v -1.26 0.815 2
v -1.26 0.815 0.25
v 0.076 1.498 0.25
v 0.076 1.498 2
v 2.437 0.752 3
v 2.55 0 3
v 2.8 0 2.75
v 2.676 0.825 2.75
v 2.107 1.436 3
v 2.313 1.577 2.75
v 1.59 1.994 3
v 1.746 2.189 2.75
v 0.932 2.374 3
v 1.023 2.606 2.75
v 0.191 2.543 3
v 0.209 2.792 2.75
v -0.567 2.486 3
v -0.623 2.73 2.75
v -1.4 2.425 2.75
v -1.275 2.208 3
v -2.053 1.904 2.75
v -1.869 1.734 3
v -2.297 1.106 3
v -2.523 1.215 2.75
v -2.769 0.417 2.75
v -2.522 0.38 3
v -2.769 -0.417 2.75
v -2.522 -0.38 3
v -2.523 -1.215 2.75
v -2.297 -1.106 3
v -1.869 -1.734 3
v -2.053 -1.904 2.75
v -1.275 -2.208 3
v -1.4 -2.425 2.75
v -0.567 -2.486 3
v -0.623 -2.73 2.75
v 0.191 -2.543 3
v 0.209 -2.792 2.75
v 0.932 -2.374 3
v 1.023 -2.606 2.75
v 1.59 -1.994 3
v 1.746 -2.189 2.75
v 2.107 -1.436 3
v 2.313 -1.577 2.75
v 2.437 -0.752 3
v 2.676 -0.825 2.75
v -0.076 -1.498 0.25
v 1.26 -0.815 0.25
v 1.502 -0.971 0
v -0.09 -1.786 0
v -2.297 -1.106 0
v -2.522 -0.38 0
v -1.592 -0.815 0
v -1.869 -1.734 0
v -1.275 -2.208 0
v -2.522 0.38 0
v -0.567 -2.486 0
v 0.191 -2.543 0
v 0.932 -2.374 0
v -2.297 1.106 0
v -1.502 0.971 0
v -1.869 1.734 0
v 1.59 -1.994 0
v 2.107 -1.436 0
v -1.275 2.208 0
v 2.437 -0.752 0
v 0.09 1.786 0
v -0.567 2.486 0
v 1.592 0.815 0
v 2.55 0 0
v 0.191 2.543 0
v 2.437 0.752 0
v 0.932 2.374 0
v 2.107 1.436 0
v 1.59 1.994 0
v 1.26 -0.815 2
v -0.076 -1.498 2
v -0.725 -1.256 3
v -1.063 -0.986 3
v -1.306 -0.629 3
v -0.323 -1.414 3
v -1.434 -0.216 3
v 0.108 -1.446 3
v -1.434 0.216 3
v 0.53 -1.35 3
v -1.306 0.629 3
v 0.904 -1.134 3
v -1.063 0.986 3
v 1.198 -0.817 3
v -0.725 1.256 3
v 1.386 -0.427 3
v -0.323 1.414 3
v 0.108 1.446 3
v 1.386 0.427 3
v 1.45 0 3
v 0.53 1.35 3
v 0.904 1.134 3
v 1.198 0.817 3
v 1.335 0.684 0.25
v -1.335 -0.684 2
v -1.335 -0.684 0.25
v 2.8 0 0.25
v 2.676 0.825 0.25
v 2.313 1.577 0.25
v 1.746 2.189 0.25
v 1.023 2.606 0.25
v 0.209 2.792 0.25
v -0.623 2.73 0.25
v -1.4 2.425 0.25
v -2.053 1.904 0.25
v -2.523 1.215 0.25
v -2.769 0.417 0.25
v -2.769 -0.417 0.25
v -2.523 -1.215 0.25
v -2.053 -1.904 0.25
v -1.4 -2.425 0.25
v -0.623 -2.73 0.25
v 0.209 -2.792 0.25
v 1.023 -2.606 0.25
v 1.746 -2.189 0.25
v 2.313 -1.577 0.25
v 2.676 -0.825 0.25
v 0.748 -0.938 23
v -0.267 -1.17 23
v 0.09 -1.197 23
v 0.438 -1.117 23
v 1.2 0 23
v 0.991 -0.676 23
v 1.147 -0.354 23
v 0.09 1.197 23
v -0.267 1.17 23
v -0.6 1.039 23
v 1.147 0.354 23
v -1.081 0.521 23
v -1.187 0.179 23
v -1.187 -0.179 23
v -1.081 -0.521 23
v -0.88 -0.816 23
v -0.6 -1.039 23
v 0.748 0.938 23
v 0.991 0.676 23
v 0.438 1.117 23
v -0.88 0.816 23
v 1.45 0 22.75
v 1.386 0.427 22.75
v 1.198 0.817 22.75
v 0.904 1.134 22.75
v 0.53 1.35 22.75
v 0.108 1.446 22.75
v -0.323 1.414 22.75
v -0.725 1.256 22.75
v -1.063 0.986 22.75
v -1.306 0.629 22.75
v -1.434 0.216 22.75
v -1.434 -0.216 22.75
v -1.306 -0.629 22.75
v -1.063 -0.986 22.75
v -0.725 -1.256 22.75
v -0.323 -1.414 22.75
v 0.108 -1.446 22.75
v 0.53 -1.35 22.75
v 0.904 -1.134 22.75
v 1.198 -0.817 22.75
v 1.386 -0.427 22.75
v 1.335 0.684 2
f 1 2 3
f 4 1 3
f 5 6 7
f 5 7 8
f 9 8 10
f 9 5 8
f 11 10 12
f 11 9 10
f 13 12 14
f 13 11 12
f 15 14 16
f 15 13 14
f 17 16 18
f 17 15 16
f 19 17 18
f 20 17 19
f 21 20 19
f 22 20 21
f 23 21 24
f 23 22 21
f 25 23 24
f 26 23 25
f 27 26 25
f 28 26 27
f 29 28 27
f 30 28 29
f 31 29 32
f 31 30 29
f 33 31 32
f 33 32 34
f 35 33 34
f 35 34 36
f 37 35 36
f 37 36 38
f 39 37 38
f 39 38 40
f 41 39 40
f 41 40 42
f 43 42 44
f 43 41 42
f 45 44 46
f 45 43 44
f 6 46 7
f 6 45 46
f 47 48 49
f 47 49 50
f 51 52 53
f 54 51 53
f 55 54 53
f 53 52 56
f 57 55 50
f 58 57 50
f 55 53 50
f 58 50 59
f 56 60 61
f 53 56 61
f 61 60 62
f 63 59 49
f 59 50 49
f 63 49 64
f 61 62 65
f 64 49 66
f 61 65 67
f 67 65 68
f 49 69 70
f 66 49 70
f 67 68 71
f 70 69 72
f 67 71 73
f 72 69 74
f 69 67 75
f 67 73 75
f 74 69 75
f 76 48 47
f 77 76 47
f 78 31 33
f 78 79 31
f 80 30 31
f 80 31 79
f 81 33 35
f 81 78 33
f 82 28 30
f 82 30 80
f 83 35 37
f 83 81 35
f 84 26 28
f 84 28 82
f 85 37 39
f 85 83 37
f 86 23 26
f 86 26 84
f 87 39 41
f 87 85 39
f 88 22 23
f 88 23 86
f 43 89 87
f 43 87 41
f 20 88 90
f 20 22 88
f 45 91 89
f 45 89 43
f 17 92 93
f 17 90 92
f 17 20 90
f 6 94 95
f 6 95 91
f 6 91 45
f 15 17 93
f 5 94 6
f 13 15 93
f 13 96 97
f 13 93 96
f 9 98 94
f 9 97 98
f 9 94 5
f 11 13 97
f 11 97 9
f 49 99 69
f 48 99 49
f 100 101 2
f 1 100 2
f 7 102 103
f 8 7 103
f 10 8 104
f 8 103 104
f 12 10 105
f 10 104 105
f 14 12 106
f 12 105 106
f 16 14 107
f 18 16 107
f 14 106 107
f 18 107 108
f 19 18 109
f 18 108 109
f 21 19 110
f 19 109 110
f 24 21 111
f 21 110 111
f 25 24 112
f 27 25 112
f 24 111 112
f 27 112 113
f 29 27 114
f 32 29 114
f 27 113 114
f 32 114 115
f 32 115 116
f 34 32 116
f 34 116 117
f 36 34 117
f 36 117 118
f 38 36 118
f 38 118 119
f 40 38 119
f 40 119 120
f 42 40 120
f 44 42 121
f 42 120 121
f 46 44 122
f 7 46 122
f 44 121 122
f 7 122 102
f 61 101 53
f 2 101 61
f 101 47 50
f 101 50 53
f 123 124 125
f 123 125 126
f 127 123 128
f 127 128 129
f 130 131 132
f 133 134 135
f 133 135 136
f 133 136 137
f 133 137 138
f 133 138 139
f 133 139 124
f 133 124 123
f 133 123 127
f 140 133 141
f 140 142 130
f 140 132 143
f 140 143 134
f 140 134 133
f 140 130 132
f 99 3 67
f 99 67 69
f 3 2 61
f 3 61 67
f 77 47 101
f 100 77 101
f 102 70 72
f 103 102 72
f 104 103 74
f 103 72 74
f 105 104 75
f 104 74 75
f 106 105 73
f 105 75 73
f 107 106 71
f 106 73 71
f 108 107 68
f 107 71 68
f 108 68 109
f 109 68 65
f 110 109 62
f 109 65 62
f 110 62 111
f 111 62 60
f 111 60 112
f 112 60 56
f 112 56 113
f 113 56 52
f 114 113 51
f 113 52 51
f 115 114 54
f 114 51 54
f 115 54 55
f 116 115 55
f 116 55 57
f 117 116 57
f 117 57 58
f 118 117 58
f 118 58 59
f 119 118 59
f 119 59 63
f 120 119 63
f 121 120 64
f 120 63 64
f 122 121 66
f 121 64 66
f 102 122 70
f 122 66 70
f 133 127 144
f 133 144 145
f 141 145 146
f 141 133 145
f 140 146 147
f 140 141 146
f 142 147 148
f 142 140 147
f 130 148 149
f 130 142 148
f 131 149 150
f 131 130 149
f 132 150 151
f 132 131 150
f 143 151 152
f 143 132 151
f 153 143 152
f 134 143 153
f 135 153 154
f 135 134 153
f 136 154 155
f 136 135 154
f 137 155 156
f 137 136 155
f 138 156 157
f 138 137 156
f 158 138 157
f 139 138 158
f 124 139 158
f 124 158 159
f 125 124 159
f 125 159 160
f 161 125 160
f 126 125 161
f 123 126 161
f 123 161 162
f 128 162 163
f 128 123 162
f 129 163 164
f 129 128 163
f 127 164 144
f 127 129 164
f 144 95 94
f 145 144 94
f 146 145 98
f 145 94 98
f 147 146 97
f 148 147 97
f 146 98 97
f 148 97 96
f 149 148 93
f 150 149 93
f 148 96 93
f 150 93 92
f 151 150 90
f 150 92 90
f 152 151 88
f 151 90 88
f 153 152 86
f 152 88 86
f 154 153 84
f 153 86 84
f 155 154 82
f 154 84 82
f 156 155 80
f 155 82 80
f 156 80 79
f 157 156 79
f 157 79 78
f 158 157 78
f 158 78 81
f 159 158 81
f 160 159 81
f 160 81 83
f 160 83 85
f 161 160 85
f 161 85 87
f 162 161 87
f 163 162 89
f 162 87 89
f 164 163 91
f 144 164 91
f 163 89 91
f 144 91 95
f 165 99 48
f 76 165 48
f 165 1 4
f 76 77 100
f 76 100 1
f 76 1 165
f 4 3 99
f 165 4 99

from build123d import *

# Parameters (mm, degrees)
SKETCH_R     = 2.8
PAD_DEPTH    = 3
SKETCH001_R  = 1.45
PAD001_DEPTH = 20
POCKET_DEPTH = 2
CHAMFER_SIZE = 0.25


with BuildPart() as part:
    # Sketch → Pad (new body)
    with BuildSketch(Plane.XY):
        Circle(SKETCH_R)
    extrude(amount=PAD_DEPTH)

    # Sketch001 (on Face3 of Pad) → Pad001 (join)
    with BuildSketch(Plane.XY.offset(3)):
        Circle(SKETCH001_R)
    extrude(amount=PAD001_DEPTH)

    # Sketch002 (on Face2 of Pad001) → Pocket (cut)
    with BuildSketch(Plane(origin=(0, 0, 0), x_dir=(1, 0, 0), z_dir=(0, 0, -1))):
        Polygon((1.259542, 0.814588), (-0.075682, 1.49809), (-1.335225, 0.683502), (-1.259542, -0.814588), (0.075682, -1.49809), (1.335225, -0.683502), align=None)
    extrude(amount=-POCKET_DEPTH, mode=Mode.SUBTRACT)

    # Chamfer
    chamfer_edges = [part.edges().sort_by_distance(p)[0] for p in [
        (-2.8, 0, 3),
        (-2.8, 0, 0),
        (1.297384, -0.065543, 0),
        (0.705454, 1.090796, 0),
        (-0.59193, 1.156339, 0),
        (-1.297384, 0.065543, 0),
        (-0.705454, -1.090796, 0),
        (0.59193, -1.156339, 0),
        (-1.45, 0, 23),
    ]]
    chamfer(chamfer_edges, length=CHAMFER_SIZE)


solid = part.part
